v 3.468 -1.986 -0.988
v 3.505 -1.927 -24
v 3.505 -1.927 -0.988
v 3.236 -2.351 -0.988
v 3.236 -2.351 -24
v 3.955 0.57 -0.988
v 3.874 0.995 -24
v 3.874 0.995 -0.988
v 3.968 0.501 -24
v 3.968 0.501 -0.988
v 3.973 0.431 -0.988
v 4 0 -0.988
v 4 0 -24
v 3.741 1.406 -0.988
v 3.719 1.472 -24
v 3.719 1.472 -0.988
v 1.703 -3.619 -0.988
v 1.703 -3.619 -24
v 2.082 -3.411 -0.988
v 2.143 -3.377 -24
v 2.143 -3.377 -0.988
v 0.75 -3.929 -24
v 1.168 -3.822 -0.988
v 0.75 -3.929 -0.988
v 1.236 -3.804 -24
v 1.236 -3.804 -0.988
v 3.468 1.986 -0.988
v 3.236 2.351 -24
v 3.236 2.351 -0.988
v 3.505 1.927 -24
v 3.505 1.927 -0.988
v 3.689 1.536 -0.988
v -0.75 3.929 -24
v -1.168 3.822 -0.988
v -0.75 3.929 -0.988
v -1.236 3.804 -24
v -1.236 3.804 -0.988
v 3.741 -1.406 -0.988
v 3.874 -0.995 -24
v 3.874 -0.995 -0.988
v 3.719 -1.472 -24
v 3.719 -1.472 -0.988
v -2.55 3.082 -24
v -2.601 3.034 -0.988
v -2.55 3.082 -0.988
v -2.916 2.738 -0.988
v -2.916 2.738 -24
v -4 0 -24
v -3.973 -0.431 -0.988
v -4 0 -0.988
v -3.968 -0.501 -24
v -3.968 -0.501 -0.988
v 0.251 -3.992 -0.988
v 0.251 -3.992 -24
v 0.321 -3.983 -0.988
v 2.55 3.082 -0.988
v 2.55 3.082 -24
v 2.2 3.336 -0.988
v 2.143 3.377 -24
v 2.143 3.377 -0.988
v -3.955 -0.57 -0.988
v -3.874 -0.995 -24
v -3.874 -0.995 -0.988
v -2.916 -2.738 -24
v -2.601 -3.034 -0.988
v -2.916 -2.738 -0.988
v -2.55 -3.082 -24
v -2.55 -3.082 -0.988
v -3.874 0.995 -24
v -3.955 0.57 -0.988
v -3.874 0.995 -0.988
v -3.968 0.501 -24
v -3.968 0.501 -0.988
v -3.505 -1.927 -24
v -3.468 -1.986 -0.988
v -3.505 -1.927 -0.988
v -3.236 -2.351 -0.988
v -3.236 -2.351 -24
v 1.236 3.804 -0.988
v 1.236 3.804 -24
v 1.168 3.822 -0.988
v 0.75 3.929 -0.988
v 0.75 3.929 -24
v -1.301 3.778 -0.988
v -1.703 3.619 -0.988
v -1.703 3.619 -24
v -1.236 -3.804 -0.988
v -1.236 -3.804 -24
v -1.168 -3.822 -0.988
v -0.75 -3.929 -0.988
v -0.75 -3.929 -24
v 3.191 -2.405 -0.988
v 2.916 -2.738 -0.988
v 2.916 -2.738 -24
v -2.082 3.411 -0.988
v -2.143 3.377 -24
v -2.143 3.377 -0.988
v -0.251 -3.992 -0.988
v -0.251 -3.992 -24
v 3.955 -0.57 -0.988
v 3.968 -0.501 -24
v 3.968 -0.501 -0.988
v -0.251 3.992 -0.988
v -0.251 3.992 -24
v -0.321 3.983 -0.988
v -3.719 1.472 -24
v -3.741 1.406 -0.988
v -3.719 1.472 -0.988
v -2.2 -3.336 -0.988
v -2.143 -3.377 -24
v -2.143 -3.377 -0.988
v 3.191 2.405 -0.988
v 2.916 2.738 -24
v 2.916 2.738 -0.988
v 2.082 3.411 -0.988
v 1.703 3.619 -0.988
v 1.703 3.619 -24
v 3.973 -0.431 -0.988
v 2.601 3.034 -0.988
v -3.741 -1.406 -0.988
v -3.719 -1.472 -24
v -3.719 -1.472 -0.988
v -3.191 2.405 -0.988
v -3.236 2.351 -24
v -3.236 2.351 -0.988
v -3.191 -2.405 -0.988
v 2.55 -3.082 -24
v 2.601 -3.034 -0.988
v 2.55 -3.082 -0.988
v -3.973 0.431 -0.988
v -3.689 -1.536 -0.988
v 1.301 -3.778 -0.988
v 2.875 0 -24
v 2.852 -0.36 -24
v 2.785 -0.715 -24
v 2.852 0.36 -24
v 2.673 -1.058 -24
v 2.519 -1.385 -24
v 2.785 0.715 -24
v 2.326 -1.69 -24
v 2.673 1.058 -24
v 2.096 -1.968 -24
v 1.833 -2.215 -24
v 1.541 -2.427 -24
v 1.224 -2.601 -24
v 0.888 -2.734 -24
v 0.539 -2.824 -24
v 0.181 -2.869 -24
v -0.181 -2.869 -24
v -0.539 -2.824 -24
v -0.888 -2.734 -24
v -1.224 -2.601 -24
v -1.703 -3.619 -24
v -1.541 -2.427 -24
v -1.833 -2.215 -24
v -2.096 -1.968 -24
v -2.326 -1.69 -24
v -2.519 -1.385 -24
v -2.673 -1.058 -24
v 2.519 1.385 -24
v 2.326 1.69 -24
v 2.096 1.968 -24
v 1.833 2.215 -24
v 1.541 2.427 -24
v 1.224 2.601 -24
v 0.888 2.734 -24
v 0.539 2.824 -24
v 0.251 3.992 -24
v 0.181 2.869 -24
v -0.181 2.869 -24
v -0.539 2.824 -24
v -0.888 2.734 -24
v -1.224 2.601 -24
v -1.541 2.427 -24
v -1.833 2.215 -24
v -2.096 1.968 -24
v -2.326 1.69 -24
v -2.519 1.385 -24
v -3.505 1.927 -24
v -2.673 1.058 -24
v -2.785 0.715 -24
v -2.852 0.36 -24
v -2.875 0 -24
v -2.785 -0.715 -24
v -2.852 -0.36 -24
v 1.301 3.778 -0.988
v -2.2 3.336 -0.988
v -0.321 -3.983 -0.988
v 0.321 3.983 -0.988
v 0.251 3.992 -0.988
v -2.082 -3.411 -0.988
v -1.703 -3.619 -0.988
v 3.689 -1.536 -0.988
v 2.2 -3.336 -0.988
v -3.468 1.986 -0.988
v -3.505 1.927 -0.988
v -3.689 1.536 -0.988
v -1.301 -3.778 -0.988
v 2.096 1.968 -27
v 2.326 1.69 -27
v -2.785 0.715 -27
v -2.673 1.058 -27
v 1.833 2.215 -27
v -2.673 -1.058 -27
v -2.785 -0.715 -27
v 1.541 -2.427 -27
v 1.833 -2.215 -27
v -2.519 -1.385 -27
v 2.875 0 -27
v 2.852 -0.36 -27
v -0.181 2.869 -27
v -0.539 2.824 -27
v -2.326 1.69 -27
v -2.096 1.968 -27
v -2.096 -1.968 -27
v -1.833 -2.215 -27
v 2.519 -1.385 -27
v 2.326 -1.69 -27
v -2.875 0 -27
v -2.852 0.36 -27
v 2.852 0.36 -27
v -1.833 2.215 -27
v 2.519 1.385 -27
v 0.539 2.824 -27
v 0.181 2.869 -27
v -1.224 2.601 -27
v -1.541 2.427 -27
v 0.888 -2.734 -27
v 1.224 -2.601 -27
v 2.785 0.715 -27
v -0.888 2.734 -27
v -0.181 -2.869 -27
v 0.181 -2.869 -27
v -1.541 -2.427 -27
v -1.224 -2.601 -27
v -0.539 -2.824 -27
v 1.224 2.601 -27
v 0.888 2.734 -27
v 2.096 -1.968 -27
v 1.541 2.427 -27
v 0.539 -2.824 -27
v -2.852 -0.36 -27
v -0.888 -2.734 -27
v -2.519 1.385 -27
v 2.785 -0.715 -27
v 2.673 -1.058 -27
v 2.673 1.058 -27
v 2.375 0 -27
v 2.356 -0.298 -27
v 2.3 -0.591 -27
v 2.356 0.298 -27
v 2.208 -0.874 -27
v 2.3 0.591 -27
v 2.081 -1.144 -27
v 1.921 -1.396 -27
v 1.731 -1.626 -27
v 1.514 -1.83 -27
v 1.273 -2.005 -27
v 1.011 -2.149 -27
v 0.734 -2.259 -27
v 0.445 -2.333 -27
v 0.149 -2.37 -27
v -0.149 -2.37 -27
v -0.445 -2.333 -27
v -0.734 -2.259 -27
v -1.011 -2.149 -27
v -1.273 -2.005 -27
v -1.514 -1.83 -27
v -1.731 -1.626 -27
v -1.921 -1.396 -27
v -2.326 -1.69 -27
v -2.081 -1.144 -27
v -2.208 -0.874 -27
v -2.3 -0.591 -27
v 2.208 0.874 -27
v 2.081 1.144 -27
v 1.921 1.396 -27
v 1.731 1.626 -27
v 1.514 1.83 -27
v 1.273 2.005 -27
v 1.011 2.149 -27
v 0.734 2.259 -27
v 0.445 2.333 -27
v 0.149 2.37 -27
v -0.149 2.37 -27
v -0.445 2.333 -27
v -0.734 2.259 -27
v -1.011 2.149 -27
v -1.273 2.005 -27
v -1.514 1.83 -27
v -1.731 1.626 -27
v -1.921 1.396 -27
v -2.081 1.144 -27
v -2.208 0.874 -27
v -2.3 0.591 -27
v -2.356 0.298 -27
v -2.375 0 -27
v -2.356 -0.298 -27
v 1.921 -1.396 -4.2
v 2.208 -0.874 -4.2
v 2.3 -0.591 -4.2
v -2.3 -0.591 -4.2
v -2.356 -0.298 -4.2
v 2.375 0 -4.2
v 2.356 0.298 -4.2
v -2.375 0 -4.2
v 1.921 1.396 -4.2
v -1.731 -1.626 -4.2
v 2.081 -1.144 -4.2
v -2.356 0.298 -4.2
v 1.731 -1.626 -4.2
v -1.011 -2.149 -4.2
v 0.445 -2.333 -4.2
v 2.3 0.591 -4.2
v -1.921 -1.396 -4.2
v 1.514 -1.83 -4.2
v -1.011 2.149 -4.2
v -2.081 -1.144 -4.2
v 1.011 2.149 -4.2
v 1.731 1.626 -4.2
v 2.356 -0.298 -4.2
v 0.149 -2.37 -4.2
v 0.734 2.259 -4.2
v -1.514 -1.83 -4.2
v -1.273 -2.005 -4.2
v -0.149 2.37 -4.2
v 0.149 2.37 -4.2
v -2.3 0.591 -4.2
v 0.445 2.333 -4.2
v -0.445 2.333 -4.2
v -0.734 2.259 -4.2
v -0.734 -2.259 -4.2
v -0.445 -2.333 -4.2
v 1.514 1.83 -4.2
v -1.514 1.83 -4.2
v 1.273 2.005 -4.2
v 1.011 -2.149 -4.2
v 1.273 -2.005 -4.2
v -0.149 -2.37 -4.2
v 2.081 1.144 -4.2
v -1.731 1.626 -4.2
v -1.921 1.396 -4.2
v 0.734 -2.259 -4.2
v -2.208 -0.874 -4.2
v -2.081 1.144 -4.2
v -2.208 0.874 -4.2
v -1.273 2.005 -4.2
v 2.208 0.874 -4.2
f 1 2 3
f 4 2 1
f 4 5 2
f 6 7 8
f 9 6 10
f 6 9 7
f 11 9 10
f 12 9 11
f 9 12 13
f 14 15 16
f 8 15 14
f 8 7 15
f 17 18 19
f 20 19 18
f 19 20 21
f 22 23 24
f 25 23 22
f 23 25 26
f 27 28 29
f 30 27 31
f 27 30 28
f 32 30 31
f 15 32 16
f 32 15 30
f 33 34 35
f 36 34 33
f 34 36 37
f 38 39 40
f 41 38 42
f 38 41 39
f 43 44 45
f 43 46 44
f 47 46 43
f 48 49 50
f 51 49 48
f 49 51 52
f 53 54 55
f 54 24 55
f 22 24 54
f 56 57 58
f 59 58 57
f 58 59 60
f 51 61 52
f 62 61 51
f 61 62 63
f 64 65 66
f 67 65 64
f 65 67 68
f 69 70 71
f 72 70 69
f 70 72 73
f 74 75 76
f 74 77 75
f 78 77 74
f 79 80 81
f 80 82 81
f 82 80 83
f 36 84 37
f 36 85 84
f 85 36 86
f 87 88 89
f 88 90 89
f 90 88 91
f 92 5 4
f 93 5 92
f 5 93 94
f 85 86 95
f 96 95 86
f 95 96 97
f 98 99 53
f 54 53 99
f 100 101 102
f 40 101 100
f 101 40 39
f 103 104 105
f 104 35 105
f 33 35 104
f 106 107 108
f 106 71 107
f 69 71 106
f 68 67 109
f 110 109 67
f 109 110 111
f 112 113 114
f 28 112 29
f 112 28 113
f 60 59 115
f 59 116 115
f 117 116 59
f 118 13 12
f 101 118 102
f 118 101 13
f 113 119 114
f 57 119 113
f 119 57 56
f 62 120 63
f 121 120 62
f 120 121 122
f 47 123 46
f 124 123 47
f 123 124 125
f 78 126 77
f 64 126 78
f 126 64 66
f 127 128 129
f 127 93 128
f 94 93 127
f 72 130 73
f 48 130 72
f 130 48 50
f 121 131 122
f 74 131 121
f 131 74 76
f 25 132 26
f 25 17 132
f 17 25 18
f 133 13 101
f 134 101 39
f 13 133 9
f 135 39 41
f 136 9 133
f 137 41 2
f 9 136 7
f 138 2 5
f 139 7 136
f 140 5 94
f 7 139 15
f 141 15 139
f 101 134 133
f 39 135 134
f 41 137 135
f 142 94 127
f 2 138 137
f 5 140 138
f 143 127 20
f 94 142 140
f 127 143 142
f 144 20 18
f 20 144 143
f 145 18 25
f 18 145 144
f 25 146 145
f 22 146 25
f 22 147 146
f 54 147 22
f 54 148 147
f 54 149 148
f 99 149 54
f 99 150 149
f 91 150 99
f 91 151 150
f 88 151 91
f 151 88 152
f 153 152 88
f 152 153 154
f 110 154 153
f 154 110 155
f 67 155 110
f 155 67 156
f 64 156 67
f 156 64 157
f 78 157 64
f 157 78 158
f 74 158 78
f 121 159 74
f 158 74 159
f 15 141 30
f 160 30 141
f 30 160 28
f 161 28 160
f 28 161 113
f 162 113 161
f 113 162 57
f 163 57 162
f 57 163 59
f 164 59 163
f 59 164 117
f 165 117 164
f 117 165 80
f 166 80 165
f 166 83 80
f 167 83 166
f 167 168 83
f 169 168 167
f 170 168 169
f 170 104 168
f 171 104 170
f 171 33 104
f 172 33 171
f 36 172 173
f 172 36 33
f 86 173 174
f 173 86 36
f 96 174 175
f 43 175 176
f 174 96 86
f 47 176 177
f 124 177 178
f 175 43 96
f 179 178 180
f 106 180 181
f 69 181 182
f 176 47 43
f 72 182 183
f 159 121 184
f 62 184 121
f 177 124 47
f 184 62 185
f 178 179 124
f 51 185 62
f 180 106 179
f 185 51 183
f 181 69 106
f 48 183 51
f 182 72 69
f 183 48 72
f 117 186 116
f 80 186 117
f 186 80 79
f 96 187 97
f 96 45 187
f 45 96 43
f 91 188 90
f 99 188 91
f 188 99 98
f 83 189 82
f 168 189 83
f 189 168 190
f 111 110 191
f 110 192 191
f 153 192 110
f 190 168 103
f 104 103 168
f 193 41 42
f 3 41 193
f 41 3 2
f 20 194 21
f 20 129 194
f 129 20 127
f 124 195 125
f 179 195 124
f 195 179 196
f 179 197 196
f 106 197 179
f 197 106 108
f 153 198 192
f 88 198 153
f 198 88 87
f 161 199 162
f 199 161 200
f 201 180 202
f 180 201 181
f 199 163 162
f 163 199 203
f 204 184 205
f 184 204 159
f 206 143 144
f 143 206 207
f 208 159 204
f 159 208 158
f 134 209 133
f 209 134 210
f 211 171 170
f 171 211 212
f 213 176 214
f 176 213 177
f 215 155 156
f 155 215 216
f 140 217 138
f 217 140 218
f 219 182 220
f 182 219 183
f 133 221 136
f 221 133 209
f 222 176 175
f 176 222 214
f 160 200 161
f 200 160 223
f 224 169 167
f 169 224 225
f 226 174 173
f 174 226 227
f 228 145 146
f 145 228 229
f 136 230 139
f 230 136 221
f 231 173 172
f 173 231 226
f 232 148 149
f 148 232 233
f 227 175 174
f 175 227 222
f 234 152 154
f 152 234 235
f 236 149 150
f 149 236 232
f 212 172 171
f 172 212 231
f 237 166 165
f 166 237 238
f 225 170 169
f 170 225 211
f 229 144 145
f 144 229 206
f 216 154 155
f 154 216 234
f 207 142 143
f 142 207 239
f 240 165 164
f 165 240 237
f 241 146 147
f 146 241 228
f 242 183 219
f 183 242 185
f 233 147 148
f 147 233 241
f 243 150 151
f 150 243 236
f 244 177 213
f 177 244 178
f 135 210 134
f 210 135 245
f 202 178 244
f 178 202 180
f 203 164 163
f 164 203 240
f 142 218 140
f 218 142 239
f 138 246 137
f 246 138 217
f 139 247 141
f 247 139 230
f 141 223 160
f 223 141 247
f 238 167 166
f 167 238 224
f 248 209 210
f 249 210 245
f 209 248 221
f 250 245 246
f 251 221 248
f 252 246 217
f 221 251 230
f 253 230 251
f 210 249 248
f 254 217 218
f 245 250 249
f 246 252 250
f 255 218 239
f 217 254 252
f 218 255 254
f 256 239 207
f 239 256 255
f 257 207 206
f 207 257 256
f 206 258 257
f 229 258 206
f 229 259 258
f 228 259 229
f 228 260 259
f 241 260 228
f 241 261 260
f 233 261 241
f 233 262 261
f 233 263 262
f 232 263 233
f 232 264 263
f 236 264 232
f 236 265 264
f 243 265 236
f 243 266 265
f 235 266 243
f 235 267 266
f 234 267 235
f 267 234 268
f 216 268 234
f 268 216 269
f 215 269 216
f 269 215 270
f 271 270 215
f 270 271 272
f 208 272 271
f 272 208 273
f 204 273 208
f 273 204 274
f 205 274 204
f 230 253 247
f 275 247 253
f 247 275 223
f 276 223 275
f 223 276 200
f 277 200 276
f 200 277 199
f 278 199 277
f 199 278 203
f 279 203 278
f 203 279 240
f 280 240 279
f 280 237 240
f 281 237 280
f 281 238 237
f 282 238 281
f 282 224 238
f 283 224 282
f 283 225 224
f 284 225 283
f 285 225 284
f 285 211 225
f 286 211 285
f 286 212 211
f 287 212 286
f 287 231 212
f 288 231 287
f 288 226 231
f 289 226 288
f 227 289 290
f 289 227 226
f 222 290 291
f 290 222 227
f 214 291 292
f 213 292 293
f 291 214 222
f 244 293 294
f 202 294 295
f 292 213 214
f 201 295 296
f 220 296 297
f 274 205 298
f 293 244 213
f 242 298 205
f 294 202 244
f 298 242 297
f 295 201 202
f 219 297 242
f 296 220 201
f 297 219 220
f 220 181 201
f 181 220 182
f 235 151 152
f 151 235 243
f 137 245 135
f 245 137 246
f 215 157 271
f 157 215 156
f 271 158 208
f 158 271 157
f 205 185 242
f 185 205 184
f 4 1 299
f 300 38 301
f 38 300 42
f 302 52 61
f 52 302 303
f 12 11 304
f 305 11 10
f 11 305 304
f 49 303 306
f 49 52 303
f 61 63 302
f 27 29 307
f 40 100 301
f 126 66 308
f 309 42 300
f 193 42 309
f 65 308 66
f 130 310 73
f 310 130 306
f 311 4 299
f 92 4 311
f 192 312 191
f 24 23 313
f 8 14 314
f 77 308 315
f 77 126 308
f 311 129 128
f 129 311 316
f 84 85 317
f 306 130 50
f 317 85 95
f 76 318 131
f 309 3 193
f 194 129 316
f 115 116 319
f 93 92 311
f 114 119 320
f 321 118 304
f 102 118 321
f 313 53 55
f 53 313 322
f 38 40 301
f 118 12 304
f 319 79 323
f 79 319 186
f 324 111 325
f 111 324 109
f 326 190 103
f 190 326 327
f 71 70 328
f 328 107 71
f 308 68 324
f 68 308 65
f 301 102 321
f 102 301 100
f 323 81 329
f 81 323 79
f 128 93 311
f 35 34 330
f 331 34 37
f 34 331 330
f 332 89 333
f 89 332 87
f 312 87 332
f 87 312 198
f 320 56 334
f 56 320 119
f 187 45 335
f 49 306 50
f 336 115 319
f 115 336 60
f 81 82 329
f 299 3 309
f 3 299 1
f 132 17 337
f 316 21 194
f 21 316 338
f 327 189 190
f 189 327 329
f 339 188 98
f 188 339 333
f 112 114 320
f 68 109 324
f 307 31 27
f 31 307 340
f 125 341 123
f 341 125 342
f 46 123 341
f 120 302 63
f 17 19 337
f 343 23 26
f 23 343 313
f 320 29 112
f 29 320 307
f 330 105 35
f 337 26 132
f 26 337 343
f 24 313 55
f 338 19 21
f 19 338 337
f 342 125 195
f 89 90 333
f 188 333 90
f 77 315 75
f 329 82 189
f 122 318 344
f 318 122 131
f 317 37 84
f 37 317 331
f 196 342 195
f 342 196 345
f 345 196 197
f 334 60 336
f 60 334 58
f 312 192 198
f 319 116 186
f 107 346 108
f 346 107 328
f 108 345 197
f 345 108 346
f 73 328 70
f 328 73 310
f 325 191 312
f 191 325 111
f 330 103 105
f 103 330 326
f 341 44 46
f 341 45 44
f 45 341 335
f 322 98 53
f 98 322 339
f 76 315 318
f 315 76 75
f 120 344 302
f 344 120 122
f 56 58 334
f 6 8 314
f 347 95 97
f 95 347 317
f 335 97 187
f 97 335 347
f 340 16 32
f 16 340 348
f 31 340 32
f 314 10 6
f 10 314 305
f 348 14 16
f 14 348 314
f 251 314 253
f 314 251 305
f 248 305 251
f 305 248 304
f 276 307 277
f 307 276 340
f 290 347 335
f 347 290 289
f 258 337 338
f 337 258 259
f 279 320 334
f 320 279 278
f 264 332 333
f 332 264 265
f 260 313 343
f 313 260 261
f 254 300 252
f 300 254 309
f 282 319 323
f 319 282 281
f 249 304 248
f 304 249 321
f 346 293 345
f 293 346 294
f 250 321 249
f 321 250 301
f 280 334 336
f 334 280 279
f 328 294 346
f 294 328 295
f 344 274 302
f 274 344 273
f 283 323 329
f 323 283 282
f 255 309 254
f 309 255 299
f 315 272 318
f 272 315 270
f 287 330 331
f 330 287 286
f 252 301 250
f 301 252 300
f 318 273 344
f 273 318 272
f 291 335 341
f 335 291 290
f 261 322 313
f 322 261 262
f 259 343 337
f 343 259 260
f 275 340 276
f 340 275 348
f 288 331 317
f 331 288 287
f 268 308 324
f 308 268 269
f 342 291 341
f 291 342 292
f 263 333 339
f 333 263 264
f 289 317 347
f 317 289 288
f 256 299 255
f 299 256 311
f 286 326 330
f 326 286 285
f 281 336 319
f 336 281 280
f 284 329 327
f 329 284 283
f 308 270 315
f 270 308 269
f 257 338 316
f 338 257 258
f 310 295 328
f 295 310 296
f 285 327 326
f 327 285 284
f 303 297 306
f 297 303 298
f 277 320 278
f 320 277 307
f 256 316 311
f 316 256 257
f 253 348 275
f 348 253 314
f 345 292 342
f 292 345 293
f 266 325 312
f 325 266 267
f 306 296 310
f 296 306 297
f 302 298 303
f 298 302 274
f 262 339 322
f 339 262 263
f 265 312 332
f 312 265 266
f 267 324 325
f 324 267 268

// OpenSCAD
$fn = 50;

difference() {
	union() {
		translate(v = [0, 0, -24.0]) {
			cylinder(h = 24, r = 4.0);
		}
		#translate(v = [0, 0, -27.0]) {
			cylinder(h = 27, r = 2.875);
		}
	}
	union() {
		translate(v = [0, 0, 0]) {
			rotate(a = [0, 0, 0]) {
				difference() {
					union() {
						translate(v = [0, 0, -27.0]) {
							cylinder(h = 27, r = 2.25);
						}
						translate(v = [0, 0, -4.2]) {
							cylinder(h = 4.2, r1 = 2.375, r2 = 4.5);
						}
						translate(v = [0, 0, -27.0]) {
							cylinder(h = 27, r = 2.375);
						}
						translate(v = [0, 0, -27.0]) {
							cylinder(h = 27, r = 2.25);
						}
					}
					union();
				}
			}
		}
	}
}
